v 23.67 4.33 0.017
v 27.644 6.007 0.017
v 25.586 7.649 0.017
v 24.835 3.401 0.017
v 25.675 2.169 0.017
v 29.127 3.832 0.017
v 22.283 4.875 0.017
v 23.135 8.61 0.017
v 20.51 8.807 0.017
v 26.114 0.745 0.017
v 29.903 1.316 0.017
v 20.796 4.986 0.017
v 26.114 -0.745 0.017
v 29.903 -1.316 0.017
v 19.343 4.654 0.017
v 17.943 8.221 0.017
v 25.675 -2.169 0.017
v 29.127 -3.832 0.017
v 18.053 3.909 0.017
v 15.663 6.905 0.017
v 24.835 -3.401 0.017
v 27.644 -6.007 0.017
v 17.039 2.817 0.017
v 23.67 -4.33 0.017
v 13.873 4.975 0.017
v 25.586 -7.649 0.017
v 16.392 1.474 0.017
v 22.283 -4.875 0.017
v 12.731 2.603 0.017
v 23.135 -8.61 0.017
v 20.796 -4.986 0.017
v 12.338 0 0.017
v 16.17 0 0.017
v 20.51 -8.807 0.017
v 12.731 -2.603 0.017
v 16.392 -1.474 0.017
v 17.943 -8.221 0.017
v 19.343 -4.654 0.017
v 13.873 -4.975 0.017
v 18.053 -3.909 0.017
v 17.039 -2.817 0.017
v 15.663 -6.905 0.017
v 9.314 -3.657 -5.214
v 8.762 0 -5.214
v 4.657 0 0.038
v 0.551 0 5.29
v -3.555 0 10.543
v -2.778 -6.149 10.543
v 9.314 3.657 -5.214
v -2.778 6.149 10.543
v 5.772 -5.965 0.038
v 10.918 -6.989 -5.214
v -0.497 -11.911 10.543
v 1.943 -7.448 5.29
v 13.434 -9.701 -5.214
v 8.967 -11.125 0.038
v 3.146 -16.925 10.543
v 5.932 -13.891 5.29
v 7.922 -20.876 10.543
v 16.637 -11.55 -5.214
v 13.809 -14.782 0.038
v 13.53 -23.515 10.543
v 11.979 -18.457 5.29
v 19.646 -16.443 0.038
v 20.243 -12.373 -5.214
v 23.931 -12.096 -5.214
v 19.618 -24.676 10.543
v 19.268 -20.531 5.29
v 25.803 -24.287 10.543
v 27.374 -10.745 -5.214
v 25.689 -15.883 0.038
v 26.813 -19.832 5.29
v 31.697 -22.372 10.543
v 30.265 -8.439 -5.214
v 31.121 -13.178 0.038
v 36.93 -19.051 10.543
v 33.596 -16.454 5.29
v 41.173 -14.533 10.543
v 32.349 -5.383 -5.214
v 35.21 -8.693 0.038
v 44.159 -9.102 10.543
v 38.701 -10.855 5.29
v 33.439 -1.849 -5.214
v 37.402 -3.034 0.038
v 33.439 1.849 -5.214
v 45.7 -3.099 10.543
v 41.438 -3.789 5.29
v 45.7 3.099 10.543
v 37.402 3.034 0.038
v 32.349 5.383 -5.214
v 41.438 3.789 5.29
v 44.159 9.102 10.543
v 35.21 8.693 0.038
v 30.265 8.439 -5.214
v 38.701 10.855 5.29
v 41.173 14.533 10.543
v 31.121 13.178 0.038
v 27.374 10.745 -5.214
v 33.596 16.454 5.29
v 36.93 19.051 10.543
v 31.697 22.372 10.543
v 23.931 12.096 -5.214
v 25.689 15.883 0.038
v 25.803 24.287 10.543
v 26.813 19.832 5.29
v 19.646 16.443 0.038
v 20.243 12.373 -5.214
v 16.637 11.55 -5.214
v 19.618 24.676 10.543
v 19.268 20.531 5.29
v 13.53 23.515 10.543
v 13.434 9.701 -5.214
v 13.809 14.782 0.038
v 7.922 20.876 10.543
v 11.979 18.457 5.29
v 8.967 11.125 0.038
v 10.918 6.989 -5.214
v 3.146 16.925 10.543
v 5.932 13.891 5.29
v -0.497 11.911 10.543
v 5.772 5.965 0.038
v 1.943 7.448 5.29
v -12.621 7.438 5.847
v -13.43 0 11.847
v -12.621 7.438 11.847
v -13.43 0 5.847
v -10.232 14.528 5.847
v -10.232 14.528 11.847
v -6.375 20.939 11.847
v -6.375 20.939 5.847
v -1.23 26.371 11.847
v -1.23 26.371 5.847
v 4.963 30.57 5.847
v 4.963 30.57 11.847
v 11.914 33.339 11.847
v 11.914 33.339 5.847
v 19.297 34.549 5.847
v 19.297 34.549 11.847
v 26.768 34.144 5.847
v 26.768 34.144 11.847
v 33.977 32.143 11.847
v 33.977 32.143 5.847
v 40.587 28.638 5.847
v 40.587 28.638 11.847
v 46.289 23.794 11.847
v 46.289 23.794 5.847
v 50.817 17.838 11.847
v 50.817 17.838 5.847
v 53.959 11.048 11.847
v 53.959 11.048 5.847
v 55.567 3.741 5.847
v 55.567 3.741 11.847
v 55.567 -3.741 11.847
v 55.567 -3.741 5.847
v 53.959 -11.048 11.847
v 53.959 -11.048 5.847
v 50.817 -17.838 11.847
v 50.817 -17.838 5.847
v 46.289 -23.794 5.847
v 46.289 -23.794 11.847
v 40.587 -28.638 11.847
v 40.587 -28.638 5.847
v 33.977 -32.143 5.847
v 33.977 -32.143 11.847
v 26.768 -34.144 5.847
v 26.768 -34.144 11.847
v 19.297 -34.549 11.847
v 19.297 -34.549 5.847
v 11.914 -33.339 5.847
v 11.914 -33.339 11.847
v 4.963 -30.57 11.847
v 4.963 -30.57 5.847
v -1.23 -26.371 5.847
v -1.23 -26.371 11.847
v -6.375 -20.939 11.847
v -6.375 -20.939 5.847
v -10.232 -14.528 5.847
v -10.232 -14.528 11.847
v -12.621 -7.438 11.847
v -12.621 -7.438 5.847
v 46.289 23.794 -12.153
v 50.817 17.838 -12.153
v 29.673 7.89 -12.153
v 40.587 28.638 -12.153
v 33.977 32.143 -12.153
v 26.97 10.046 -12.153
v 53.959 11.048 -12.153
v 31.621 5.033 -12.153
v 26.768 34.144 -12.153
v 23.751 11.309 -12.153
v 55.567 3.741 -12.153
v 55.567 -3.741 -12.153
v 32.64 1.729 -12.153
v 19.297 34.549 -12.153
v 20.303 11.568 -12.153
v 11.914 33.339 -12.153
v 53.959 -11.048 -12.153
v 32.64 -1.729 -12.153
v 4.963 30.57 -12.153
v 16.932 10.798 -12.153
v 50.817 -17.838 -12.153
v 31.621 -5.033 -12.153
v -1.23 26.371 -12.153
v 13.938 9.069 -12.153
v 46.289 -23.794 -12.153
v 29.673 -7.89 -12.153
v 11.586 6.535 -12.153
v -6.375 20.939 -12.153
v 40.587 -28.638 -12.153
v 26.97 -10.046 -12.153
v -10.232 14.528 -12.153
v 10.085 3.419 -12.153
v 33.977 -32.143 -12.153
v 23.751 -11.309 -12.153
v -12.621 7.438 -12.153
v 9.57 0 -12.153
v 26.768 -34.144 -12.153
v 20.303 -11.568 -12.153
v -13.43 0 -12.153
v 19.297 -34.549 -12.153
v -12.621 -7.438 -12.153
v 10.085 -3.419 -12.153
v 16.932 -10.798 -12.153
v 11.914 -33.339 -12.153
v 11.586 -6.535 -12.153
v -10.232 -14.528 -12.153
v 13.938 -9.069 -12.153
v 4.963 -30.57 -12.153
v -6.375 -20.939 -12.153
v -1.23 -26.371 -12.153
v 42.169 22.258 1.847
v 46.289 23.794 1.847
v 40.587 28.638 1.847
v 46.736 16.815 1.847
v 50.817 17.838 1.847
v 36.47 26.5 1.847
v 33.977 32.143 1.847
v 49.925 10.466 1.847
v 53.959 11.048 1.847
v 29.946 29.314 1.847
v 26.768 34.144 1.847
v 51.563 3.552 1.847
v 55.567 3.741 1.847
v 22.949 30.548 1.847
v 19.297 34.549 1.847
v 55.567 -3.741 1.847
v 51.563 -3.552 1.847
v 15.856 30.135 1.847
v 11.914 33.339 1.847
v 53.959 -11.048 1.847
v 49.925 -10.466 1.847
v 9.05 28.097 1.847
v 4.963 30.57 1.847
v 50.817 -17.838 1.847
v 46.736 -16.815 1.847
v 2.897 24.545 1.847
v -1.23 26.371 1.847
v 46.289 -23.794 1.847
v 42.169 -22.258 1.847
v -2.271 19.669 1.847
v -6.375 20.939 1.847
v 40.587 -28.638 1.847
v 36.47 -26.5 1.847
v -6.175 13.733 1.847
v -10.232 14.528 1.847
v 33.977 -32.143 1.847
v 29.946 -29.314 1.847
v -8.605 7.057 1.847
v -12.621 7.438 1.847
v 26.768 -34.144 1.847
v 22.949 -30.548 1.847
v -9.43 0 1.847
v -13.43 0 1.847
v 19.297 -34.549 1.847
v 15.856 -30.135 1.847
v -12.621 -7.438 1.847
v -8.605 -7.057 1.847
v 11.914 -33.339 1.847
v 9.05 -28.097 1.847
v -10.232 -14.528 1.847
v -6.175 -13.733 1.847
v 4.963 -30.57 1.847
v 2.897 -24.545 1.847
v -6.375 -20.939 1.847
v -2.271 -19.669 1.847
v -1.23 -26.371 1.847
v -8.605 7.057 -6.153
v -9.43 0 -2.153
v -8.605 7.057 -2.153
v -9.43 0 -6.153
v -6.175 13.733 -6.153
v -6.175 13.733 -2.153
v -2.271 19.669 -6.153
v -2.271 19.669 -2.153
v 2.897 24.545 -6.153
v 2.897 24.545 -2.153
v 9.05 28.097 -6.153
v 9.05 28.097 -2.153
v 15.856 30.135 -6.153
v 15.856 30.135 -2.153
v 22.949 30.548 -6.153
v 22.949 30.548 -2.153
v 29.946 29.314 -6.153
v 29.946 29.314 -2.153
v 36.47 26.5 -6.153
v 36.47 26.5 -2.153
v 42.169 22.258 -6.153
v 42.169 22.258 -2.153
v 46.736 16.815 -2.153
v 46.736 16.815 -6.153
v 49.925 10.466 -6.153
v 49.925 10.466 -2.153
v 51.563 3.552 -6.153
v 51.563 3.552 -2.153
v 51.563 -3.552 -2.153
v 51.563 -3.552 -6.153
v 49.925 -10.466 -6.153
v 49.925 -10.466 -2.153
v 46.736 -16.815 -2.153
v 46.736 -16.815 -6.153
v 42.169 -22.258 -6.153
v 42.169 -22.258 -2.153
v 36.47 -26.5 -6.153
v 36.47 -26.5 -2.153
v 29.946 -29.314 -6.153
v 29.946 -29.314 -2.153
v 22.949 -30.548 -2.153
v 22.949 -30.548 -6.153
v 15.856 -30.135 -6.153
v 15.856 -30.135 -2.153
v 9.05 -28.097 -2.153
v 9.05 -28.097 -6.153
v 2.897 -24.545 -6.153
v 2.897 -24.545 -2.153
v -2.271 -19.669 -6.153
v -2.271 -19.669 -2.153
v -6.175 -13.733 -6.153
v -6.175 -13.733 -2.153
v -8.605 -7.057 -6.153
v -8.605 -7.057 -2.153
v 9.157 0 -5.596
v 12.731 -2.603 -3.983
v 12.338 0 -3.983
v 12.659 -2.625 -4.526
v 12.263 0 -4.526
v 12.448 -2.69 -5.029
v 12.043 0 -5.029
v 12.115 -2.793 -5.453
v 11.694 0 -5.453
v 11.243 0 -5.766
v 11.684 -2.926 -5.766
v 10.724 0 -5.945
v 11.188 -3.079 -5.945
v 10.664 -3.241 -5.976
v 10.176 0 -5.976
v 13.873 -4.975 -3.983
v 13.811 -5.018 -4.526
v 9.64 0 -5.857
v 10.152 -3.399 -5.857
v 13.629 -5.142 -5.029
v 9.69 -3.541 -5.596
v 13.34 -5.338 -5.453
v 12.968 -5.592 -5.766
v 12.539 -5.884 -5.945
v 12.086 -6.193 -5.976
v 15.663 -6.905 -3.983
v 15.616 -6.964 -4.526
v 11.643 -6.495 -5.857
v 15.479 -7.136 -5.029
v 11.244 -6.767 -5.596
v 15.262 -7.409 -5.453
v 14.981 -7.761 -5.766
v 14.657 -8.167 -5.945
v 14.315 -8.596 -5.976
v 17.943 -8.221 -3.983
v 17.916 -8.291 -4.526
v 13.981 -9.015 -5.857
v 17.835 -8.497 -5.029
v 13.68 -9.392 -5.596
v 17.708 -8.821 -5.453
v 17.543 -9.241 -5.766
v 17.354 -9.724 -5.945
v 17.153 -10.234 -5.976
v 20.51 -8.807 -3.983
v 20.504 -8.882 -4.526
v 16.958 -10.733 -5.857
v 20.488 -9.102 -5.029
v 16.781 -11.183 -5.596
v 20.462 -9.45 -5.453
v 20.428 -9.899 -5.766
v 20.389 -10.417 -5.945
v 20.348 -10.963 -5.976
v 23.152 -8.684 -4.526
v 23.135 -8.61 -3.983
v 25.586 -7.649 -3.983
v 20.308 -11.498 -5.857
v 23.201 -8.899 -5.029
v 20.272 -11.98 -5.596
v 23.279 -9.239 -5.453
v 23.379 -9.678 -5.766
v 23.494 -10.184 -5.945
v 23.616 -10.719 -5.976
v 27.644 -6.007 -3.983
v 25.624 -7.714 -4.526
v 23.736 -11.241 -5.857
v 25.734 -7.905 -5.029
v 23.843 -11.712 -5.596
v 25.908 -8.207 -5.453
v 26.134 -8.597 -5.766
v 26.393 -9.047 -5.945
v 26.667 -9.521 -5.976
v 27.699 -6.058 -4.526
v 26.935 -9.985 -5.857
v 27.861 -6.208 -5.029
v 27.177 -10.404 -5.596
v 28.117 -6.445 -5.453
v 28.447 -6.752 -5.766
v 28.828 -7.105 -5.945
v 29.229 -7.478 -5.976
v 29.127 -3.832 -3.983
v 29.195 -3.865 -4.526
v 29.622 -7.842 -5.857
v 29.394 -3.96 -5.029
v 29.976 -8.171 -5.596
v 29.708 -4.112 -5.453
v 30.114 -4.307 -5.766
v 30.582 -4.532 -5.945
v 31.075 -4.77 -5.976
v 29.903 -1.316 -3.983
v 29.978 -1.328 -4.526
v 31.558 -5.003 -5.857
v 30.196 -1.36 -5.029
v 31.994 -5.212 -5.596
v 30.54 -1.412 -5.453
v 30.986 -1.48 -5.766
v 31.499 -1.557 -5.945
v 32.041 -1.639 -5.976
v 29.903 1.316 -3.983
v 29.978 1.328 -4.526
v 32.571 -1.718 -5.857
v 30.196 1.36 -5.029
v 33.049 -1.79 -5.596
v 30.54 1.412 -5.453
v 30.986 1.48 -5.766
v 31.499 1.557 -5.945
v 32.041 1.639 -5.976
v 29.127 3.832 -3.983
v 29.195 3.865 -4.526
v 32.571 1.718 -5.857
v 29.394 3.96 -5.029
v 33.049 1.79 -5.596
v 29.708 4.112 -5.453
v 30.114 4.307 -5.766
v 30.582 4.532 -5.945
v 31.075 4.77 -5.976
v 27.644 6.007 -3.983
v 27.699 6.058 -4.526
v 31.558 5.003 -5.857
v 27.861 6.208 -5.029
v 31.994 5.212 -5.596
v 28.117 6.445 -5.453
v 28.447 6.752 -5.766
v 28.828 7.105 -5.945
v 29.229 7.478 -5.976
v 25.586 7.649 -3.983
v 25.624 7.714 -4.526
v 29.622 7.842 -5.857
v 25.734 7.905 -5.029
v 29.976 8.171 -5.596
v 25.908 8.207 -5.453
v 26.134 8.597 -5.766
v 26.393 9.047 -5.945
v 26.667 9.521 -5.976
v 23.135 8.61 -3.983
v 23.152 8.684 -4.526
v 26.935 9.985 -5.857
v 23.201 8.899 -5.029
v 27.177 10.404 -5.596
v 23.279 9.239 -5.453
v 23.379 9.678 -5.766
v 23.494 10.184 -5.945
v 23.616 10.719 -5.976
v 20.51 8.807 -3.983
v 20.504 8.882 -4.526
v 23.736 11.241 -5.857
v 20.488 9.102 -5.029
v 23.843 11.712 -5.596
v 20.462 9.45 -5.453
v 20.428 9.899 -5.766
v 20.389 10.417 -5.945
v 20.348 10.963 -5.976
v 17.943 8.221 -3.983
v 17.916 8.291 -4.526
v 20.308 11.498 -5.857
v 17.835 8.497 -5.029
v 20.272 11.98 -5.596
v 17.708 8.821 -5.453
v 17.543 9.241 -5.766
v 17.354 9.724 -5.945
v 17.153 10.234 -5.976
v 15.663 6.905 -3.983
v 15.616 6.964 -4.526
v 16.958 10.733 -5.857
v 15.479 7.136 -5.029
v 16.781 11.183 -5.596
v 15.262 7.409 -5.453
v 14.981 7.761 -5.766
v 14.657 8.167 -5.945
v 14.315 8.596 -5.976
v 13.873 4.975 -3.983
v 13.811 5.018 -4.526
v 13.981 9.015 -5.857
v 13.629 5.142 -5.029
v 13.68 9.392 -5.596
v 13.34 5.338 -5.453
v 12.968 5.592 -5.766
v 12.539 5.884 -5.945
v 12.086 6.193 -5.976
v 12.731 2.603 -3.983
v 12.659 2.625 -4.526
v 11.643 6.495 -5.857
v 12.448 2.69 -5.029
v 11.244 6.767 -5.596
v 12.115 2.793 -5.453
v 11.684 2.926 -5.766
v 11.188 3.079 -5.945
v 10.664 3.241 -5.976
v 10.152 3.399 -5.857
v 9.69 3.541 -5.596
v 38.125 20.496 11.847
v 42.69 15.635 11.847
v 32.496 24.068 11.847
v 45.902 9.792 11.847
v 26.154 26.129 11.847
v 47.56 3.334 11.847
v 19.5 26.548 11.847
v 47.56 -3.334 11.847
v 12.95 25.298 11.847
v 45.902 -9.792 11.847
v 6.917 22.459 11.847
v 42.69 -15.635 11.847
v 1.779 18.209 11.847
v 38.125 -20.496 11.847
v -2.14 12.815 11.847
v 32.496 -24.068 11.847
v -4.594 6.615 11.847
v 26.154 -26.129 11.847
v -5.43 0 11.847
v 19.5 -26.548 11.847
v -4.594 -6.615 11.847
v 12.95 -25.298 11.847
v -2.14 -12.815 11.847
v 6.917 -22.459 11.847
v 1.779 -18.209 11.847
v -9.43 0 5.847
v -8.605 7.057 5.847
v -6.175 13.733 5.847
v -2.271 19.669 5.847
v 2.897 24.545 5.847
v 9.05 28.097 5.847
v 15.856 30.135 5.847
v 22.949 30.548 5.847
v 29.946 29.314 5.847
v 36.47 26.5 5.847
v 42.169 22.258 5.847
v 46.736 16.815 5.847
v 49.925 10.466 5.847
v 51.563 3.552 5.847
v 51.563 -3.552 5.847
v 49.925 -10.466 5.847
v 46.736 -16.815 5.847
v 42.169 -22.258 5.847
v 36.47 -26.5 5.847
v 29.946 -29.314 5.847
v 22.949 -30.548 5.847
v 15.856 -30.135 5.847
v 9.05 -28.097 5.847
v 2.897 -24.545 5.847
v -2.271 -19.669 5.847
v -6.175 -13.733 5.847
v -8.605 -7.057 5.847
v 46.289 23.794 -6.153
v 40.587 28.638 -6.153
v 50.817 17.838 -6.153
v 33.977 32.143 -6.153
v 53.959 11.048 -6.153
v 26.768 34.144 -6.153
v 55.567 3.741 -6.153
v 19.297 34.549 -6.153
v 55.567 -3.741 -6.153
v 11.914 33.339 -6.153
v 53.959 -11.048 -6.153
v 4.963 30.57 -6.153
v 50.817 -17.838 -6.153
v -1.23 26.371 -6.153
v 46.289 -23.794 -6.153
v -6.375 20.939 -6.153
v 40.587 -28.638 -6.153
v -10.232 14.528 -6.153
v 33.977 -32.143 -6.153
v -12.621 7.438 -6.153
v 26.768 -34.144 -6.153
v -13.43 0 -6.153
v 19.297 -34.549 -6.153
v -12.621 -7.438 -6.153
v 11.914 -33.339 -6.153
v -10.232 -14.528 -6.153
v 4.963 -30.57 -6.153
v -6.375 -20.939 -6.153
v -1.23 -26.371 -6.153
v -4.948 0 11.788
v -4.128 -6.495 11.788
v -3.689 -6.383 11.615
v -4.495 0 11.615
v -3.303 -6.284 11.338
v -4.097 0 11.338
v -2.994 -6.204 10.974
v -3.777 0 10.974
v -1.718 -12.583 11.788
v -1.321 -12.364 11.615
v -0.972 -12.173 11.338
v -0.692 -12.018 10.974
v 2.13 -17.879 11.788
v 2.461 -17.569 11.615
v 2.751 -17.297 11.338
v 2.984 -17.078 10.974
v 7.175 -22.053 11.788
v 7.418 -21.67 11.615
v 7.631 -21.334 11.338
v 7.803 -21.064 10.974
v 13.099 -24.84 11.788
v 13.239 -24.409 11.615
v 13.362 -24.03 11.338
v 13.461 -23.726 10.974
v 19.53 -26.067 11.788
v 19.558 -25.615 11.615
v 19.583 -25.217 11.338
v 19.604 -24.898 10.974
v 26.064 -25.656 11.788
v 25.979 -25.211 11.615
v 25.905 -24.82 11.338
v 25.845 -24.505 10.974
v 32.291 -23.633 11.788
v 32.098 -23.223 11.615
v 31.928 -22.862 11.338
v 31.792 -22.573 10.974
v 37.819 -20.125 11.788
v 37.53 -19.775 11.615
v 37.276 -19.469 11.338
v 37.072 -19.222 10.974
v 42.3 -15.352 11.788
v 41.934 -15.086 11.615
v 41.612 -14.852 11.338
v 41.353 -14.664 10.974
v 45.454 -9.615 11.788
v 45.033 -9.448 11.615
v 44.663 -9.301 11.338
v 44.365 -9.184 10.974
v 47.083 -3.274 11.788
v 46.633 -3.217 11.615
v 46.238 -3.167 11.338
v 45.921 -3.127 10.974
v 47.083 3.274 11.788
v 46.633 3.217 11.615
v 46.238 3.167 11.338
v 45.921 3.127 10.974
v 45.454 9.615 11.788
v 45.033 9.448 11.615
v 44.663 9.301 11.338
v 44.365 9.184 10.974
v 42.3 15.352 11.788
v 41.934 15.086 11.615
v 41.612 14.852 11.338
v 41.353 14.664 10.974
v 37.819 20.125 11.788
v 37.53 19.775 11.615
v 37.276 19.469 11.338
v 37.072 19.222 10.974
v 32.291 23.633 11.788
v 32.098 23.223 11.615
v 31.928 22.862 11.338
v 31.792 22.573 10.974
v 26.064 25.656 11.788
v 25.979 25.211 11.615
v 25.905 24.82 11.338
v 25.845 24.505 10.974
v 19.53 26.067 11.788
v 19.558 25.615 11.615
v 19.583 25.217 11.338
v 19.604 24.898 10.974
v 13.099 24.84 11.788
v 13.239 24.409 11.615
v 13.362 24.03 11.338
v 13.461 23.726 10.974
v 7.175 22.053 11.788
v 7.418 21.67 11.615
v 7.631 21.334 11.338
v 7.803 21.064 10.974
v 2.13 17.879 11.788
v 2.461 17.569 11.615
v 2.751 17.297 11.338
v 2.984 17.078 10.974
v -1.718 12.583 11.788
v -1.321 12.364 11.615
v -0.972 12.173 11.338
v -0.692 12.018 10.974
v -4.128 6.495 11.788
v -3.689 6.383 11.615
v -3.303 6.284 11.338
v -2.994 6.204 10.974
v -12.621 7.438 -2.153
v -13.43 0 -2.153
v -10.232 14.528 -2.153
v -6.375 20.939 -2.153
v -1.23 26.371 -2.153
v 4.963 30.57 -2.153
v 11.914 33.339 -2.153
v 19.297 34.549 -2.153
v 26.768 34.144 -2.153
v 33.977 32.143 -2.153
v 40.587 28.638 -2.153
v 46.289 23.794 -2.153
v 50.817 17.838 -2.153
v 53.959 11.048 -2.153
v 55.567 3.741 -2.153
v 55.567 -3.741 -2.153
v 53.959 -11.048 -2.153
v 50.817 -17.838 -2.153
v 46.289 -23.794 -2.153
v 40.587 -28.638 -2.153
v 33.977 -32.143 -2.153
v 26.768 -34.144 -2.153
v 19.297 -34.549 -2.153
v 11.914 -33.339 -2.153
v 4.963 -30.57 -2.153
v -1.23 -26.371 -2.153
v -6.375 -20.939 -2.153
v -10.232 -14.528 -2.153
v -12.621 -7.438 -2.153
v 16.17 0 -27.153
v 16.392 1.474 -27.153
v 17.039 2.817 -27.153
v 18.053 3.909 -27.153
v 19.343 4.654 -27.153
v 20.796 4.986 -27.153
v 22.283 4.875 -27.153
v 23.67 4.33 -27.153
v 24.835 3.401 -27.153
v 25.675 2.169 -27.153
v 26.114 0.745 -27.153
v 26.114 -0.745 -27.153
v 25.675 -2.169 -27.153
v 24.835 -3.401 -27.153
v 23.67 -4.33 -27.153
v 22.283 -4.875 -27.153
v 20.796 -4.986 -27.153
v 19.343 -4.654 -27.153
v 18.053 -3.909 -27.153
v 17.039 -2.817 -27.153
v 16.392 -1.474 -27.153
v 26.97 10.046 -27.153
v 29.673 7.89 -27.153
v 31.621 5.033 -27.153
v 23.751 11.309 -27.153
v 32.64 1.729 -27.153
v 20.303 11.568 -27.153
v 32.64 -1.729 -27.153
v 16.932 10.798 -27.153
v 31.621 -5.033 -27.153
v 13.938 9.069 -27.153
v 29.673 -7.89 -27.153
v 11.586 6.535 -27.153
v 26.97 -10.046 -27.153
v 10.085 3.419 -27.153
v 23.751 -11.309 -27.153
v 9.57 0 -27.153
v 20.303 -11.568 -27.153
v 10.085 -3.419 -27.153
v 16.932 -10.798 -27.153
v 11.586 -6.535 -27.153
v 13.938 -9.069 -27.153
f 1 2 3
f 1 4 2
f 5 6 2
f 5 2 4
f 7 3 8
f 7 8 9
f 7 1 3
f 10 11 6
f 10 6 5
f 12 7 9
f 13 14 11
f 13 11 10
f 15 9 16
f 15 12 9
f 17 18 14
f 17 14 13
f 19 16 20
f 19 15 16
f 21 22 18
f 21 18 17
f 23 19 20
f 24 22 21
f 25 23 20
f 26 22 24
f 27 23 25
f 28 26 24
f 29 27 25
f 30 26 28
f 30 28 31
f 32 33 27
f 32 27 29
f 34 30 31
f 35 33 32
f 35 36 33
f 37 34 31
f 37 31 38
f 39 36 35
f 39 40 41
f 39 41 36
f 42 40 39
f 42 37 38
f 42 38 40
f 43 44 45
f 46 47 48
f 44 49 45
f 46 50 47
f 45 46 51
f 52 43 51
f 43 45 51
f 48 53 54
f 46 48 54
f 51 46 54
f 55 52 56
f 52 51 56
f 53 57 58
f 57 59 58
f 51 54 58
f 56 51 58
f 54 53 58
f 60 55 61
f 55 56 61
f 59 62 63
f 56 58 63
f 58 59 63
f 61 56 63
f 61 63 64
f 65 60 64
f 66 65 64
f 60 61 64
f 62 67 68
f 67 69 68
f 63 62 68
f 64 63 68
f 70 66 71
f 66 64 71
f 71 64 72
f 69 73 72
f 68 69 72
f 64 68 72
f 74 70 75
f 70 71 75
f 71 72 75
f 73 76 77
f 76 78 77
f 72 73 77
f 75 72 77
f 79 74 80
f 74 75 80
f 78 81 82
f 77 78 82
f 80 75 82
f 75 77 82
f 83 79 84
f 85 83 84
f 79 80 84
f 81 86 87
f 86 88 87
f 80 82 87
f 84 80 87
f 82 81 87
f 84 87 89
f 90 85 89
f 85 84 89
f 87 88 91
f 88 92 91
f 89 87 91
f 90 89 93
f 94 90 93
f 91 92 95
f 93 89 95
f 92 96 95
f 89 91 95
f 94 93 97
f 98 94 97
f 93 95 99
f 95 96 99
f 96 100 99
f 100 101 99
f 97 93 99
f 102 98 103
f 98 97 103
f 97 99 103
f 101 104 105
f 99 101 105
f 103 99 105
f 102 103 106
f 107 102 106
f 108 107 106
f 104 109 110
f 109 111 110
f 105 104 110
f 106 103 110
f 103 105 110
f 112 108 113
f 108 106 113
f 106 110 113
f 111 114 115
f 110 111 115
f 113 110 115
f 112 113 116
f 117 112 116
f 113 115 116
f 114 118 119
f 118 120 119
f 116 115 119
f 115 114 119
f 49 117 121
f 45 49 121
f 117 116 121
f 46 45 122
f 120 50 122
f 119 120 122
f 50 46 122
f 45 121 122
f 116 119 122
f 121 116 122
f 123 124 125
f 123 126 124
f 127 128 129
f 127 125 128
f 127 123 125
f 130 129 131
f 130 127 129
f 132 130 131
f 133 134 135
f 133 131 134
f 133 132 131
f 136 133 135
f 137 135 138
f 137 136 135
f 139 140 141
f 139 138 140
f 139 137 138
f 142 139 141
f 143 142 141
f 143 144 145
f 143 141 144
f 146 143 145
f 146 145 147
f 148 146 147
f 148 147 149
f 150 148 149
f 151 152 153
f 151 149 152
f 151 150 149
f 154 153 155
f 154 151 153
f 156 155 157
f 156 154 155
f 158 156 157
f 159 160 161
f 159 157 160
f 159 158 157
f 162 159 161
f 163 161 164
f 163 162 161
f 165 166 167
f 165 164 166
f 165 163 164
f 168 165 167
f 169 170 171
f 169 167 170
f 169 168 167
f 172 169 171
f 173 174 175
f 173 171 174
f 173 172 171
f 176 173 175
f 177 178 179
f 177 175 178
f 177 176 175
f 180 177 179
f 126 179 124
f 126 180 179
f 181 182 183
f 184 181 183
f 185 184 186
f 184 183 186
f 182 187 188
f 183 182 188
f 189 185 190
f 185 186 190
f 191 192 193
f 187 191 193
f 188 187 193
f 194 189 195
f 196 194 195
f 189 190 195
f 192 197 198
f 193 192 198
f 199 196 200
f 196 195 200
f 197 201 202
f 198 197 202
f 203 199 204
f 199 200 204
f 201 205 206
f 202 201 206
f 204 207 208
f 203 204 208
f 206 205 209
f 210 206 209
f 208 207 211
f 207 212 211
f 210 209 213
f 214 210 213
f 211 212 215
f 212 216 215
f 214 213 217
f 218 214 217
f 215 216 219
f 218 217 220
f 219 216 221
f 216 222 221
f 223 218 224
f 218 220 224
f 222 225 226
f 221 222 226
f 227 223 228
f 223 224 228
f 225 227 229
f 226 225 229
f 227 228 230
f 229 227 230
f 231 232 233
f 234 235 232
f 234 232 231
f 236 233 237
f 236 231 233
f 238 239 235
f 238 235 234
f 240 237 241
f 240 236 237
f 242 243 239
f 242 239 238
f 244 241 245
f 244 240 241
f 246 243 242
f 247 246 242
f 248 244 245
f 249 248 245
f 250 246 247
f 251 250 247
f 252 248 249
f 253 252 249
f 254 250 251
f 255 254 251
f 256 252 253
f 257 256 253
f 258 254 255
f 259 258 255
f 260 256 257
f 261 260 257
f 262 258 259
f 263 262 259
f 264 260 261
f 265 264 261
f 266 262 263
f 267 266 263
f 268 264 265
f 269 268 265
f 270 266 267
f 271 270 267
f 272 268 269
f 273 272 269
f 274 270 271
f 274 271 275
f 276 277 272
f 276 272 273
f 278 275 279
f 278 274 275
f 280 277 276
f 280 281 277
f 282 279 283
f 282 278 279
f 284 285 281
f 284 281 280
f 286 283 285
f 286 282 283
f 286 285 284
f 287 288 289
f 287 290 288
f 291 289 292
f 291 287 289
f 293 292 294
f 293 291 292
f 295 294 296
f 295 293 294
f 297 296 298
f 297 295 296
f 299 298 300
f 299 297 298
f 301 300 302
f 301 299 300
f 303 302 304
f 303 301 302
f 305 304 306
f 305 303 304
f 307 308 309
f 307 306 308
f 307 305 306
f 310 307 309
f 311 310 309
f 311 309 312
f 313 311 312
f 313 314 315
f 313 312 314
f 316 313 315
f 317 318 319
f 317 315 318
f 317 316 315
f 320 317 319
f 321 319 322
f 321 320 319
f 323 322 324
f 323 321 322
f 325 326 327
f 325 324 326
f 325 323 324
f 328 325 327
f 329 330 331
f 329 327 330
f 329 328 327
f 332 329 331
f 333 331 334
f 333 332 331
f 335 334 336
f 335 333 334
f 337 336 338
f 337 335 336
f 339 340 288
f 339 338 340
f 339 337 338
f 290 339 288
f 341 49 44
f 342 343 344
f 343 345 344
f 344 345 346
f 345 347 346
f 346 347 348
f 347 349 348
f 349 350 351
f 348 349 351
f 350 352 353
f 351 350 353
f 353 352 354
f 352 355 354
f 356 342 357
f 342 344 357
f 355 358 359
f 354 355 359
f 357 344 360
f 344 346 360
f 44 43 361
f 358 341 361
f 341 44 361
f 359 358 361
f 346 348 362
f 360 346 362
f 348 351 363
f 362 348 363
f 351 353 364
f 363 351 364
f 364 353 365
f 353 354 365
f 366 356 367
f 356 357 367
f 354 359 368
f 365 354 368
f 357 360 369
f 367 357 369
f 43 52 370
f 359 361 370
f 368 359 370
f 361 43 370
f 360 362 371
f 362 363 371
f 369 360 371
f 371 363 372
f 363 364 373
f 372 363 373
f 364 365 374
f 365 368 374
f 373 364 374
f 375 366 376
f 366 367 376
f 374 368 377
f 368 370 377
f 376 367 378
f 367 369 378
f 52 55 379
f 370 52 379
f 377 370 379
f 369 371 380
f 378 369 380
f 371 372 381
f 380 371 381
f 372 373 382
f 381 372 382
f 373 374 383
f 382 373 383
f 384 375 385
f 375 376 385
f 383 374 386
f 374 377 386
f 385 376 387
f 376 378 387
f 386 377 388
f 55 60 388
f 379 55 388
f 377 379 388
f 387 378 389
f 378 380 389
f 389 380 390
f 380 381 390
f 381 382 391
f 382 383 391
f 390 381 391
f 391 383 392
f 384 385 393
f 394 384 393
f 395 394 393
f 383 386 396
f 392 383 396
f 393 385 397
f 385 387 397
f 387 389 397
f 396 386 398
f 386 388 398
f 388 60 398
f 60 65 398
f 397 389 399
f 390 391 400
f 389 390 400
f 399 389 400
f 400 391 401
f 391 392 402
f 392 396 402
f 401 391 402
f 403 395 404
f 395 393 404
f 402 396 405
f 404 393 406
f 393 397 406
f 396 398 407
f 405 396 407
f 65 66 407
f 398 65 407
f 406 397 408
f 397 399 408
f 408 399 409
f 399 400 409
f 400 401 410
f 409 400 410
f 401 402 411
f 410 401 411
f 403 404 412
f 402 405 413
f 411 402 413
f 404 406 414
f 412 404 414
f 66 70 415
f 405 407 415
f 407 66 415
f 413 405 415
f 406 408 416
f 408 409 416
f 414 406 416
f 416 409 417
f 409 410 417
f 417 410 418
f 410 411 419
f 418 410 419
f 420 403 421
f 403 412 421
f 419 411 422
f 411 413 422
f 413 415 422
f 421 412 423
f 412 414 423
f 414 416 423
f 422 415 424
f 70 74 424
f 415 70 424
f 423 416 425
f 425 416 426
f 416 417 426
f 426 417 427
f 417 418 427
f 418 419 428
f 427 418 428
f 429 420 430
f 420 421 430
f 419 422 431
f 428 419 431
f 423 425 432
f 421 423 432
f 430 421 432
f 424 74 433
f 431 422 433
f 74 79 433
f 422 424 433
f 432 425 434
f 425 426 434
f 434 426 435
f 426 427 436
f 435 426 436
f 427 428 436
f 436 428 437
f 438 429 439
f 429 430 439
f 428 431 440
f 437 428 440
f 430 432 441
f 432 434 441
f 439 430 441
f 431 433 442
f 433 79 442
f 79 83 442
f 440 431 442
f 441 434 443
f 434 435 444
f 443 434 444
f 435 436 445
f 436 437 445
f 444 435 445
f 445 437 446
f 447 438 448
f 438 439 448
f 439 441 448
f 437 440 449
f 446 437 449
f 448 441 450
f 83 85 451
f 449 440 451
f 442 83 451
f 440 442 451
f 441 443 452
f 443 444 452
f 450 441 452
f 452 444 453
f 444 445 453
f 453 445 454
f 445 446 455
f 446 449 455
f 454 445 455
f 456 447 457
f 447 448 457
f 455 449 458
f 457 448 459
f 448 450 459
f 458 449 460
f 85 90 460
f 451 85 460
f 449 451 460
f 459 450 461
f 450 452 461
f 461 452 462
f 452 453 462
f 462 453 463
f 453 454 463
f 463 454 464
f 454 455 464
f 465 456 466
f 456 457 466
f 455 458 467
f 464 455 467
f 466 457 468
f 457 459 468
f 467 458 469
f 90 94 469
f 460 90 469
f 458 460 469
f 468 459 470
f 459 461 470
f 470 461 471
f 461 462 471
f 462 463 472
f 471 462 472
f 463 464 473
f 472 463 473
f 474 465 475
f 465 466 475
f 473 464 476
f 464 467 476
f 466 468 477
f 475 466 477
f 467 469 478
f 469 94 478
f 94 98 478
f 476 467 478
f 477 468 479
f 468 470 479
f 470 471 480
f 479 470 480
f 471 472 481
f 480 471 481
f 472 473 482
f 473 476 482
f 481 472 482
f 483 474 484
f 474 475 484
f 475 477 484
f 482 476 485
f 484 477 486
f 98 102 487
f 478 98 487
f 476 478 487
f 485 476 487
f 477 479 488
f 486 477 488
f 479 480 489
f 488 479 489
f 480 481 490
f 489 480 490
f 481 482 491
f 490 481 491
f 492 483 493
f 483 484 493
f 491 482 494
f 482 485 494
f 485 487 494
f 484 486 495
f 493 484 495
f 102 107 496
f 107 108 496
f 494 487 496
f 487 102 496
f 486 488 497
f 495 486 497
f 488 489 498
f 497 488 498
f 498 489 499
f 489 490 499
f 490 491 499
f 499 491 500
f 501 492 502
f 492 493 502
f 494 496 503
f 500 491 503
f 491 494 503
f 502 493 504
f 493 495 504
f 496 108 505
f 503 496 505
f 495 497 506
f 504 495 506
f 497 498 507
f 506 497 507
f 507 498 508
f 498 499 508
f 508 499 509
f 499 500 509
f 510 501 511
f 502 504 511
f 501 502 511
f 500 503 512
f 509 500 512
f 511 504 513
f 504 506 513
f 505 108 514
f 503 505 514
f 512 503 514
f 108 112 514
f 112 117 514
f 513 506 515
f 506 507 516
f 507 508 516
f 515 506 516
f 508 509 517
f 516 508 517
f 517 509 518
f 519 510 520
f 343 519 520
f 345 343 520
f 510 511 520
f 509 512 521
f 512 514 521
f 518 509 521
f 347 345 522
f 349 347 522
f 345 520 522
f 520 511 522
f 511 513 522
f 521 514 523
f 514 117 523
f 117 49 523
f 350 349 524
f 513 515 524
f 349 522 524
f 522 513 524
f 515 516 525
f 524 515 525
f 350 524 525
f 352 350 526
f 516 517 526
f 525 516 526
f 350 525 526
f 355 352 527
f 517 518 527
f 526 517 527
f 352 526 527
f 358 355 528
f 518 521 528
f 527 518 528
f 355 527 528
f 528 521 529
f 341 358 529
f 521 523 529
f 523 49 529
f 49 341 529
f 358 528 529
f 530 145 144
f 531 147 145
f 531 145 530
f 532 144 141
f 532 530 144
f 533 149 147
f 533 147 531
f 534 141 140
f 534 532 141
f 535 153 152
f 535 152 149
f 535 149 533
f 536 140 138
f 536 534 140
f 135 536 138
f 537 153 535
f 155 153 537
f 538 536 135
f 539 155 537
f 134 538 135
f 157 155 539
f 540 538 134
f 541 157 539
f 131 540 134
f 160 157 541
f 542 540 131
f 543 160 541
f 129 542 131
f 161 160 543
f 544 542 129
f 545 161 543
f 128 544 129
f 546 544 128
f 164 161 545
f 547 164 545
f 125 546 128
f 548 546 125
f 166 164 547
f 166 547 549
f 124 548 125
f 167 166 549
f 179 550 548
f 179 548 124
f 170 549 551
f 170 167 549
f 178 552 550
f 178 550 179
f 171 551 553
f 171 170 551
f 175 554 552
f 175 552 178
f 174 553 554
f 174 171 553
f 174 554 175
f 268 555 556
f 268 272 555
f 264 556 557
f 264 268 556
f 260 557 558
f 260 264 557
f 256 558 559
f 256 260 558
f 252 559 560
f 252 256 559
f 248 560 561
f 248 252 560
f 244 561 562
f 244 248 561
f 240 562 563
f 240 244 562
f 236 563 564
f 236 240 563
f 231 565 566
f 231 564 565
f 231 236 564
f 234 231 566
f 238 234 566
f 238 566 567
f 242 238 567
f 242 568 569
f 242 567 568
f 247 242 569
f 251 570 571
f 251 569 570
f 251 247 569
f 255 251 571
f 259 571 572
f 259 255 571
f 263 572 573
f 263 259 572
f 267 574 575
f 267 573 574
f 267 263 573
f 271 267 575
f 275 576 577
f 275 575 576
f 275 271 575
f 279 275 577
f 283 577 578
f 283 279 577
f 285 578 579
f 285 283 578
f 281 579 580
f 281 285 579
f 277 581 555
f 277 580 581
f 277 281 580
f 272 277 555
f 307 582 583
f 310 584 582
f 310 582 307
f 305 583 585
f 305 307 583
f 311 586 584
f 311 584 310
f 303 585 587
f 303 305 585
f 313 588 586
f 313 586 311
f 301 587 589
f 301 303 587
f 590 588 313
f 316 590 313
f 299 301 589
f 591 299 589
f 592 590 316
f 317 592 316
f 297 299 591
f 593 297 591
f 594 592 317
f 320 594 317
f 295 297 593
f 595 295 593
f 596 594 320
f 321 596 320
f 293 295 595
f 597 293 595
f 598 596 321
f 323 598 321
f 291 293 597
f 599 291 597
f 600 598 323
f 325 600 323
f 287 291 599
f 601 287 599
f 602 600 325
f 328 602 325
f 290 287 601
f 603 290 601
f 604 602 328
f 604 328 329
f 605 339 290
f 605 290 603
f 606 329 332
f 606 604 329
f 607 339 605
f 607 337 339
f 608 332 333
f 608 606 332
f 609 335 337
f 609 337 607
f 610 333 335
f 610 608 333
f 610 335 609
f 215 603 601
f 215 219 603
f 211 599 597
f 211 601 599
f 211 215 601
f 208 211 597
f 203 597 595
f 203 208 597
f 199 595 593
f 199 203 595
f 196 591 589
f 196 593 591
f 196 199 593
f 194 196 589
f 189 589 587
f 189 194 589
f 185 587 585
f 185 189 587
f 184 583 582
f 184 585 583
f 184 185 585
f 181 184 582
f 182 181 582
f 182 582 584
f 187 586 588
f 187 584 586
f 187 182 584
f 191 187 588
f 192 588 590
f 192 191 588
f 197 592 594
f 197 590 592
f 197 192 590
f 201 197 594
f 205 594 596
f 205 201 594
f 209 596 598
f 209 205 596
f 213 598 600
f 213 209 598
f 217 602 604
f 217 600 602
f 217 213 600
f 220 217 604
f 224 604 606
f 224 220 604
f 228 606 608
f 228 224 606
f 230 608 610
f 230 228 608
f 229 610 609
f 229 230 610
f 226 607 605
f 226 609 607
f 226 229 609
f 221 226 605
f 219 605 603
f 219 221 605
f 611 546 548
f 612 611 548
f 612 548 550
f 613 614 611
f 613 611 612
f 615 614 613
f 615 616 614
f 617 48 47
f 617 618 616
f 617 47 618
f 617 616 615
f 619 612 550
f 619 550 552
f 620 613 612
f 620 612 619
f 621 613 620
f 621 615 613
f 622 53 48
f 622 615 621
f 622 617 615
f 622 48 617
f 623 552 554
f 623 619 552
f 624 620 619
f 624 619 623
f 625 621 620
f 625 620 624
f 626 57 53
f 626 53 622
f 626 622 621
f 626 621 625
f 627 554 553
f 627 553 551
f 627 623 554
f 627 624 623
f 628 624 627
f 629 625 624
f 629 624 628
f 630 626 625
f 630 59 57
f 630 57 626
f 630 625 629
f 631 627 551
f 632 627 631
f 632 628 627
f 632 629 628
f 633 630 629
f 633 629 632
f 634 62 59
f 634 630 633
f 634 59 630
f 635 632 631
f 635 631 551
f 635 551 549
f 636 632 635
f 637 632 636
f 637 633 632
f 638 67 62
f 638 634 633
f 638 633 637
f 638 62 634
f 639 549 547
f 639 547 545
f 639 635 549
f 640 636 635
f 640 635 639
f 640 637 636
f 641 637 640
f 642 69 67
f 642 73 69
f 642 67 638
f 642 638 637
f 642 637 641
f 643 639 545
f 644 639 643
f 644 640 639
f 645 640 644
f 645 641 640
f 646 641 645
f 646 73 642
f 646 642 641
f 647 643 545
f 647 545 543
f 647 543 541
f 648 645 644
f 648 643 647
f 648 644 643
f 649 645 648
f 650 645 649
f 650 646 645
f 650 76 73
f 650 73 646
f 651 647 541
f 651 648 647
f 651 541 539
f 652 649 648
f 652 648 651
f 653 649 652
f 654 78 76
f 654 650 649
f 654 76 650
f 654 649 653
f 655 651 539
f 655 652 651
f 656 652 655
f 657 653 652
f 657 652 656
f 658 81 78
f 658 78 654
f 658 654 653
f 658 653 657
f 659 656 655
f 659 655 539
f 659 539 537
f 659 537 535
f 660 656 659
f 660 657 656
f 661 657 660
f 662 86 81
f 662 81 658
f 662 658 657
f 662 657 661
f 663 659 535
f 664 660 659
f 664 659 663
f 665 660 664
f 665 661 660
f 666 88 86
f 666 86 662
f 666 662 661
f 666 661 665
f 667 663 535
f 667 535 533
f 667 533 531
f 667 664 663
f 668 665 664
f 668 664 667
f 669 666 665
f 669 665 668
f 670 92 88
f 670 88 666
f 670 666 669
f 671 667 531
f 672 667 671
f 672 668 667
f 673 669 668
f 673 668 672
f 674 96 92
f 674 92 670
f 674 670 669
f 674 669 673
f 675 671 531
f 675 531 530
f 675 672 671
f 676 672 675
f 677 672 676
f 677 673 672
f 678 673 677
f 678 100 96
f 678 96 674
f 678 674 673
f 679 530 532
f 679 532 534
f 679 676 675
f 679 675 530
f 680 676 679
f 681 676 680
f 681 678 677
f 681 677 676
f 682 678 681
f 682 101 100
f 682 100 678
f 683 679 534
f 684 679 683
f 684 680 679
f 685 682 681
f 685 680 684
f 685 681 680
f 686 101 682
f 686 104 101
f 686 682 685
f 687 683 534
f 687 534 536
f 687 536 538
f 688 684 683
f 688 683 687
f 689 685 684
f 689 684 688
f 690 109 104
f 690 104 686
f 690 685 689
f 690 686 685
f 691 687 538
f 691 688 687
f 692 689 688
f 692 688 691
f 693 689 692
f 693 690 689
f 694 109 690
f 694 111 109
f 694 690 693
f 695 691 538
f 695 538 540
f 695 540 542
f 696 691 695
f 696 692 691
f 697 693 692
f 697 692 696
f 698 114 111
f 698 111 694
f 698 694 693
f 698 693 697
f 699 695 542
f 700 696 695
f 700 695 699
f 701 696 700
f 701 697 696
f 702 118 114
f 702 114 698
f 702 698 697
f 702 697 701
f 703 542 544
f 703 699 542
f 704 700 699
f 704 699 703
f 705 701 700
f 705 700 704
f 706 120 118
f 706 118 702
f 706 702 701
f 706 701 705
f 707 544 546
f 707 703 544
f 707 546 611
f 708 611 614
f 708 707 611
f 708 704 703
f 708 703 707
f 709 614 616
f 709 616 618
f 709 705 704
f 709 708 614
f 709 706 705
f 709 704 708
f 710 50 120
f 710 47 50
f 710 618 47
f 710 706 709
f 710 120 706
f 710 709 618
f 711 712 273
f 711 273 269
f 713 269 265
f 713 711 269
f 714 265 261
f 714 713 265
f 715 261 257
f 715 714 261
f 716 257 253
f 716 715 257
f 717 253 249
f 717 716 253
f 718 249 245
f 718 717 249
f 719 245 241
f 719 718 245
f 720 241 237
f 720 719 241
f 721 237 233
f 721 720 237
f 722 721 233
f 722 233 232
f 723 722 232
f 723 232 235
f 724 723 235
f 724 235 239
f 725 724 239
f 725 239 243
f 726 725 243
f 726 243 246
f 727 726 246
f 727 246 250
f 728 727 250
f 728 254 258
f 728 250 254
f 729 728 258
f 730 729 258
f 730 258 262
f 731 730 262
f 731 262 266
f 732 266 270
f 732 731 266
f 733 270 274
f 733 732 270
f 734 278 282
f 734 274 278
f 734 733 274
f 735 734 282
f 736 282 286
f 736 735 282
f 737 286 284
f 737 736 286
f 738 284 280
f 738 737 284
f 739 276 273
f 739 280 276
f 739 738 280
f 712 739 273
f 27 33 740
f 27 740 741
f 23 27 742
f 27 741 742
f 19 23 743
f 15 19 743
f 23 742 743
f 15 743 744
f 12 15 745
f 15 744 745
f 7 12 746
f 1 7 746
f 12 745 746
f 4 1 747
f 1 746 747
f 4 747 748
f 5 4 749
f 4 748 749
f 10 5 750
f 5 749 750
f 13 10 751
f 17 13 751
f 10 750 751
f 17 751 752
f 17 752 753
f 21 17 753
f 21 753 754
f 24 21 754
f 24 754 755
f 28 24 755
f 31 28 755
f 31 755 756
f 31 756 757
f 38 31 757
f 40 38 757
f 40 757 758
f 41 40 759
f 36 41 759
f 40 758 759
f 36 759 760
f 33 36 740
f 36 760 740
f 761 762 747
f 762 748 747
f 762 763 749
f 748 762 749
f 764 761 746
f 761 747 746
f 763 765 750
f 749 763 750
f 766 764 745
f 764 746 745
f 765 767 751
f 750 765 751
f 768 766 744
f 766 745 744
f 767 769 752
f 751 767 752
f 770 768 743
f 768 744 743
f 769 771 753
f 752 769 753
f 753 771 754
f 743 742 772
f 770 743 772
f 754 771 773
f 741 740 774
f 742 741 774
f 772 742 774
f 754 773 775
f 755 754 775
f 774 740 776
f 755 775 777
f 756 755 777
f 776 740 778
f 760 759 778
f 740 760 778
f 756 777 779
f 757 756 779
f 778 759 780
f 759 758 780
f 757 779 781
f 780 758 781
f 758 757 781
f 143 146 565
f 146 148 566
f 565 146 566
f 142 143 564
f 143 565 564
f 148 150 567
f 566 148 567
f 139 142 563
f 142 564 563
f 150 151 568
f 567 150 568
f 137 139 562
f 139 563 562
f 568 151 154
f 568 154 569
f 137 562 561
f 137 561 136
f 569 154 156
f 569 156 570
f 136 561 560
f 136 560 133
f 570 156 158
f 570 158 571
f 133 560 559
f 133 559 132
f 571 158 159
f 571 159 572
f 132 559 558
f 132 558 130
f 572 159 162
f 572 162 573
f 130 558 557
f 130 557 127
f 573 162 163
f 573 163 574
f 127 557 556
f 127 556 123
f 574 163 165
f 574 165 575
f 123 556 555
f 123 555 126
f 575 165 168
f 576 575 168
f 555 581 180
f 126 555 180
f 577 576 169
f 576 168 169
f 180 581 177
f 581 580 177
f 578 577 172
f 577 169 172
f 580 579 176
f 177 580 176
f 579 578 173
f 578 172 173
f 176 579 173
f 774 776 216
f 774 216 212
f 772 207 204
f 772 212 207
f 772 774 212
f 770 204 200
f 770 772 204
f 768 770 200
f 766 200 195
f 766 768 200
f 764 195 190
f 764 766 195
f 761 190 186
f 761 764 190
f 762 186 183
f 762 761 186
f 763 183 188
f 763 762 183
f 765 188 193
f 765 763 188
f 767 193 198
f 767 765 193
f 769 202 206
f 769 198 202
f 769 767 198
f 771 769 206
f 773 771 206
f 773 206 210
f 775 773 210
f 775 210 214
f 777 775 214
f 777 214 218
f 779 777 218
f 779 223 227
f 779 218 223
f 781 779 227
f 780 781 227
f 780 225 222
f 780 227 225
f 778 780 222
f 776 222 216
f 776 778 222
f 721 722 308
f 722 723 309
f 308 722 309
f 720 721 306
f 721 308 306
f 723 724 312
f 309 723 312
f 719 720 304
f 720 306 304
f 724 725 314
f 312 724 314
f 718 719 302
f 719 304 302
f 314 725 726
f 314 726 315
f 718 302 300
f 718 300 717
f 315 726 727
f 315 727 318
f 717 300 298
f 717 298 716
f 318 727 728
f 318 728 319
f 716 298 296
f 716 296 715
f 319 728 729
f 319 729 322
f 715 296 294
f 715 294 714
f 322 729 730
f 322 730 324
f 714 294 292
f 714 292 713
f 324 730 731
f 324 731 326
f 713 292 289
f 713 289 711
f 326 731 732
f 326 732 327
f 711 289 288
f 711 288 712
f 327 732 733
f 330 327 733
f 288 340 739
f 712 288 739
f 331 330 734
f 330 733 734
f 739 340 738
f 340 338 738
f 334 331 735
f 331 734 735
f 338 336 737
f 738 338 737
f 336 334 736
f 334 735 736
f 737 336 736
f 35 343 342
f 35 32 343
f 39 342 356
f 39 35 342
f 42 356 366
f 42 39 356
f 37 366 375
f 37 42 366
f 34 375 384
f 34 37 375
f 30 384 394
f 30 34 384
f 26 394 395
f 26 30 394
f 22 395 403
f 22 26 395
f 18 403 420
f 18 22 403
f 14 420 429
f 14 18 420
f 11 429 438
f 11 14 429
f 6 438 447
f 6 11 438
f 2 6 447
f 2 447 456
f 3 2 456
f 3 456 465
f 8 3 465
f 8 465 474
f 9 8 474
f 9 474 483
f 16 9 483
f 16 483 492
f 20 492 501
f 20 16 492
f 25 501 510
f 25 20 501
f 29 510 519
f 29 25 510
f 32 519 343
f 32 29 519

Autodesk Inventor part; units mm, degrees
ref_plane "YZ Plane" through (0, 0, 0) normal (1, 0, 0) x (0, 1, 0)
ref_plane "XZ Plane" through (0, 0, 0) normal (0, 1, 0) x (-1, 0, 0)
ref_plane "XY Plane" through (0, 0, 0) normal (0, 0, 1) x (1, 0, 0)
sketch "Szkic1" plane through (0, 0, 0) normal (0, 1, 0) x (-1, 0, 0)
  line L0 (5.43, 11.8473) -> (13.43, 11.8473)
  line L1 (13.43, -12.1527) -> (-9.57, -12.1527)
  line L2 (-9.57, -12.1527) -> (-9.57, -27.1527)
  line L3 (-9.57, -27.1527) -> (-21.17, -27.1527)
  arc A0 (5.43, 11.8473) -> (3.5548, 10.5426) centre (5.43, 9.8473) ccw
  line L4 (3.5548, 10.5426) -> (-8.7625, -5.2144)
  arc A1 (-12.3382, -3.9827) -> (-8.7625, -5.2144) centre (-10.3382, -3.9827) ccw
  line L5 (-12.3382, -3.9827) -> (-12.3382, 0.0173)
  line L6 (-21.17, -27.1527) -> (-21.17, 0.0173)
  line L7 (-21.17, 0.0173) -> (-12.3382, 0.0173)
  line L8 (13.43, 11.8473) -> (13.43, 5.8473)
  line L9 (13.43, 5.8473) -> (9.43, 5.8473)
  line L10 (9.43, 5.8473) -> (9.43, 1.8473)
  line L11 (9.43, 1.8473) -> (13.43, 1.8473)
  line L12 (13.43, 1.8473) -> (13.43, -2.1527)
  line L13 (13.43, -2.1527) -> (9.43, -2.1527)
  line L14 (9.43, -2.1527) -> (9.43, -6.1527)
  line L15 (9.43, -6.1527) -> (13.43, -6.1527)
  line L16 (13.43, -6.1527) -> (13.43, -12.1527)
  point P0 (0, 0)
  dimension "d0" = 8
  dimension "d1" = 24
  dimension "d2" = 23
  dimension "d3" = 15
  dimension "d4" = 11.6
  dimension "d5" = 2
  dimension "d6" = 20
  dimension "d7" = 2
  dimension "d8" = 4
  dimension "d13" = 6
  dimension "d15" = 4
  dimension "d16" = 4
  dimension "d17" = 4
  dimension "d18" = 4
revolve "Obrót1" add sketch "Szkic1" angle 360 about axis through (21.17, 0, -27.1527) along (0, 0, 1)
sketch "Szkic2" plane through (21.17, 0, -27.1527) normal (0, 0, -1) x (-1, 0, 0)
  point P0 (21.17, 0)
sketch "Szkic3" plane through (21.17, 0, -27.1527) normal (0, 0, -1) x (-1, 0, 0)
  circle A0 centre (0, 0) radius 5
  point P0 (21.17, 0)
  dimension "d10" = 10
sketch "Szkic4" plane through (21.17, 0, -27.1527) normal (0, 0, -1) x (-1, 0, 0)
  point P0 (21.17, 0)
extrude "Wyciągnięcie proste1" cut sketch "Szkic3" against normal blind 39
properties part number "pierścień_uszczelniający" material "Tworzywo sztuczne PET"
